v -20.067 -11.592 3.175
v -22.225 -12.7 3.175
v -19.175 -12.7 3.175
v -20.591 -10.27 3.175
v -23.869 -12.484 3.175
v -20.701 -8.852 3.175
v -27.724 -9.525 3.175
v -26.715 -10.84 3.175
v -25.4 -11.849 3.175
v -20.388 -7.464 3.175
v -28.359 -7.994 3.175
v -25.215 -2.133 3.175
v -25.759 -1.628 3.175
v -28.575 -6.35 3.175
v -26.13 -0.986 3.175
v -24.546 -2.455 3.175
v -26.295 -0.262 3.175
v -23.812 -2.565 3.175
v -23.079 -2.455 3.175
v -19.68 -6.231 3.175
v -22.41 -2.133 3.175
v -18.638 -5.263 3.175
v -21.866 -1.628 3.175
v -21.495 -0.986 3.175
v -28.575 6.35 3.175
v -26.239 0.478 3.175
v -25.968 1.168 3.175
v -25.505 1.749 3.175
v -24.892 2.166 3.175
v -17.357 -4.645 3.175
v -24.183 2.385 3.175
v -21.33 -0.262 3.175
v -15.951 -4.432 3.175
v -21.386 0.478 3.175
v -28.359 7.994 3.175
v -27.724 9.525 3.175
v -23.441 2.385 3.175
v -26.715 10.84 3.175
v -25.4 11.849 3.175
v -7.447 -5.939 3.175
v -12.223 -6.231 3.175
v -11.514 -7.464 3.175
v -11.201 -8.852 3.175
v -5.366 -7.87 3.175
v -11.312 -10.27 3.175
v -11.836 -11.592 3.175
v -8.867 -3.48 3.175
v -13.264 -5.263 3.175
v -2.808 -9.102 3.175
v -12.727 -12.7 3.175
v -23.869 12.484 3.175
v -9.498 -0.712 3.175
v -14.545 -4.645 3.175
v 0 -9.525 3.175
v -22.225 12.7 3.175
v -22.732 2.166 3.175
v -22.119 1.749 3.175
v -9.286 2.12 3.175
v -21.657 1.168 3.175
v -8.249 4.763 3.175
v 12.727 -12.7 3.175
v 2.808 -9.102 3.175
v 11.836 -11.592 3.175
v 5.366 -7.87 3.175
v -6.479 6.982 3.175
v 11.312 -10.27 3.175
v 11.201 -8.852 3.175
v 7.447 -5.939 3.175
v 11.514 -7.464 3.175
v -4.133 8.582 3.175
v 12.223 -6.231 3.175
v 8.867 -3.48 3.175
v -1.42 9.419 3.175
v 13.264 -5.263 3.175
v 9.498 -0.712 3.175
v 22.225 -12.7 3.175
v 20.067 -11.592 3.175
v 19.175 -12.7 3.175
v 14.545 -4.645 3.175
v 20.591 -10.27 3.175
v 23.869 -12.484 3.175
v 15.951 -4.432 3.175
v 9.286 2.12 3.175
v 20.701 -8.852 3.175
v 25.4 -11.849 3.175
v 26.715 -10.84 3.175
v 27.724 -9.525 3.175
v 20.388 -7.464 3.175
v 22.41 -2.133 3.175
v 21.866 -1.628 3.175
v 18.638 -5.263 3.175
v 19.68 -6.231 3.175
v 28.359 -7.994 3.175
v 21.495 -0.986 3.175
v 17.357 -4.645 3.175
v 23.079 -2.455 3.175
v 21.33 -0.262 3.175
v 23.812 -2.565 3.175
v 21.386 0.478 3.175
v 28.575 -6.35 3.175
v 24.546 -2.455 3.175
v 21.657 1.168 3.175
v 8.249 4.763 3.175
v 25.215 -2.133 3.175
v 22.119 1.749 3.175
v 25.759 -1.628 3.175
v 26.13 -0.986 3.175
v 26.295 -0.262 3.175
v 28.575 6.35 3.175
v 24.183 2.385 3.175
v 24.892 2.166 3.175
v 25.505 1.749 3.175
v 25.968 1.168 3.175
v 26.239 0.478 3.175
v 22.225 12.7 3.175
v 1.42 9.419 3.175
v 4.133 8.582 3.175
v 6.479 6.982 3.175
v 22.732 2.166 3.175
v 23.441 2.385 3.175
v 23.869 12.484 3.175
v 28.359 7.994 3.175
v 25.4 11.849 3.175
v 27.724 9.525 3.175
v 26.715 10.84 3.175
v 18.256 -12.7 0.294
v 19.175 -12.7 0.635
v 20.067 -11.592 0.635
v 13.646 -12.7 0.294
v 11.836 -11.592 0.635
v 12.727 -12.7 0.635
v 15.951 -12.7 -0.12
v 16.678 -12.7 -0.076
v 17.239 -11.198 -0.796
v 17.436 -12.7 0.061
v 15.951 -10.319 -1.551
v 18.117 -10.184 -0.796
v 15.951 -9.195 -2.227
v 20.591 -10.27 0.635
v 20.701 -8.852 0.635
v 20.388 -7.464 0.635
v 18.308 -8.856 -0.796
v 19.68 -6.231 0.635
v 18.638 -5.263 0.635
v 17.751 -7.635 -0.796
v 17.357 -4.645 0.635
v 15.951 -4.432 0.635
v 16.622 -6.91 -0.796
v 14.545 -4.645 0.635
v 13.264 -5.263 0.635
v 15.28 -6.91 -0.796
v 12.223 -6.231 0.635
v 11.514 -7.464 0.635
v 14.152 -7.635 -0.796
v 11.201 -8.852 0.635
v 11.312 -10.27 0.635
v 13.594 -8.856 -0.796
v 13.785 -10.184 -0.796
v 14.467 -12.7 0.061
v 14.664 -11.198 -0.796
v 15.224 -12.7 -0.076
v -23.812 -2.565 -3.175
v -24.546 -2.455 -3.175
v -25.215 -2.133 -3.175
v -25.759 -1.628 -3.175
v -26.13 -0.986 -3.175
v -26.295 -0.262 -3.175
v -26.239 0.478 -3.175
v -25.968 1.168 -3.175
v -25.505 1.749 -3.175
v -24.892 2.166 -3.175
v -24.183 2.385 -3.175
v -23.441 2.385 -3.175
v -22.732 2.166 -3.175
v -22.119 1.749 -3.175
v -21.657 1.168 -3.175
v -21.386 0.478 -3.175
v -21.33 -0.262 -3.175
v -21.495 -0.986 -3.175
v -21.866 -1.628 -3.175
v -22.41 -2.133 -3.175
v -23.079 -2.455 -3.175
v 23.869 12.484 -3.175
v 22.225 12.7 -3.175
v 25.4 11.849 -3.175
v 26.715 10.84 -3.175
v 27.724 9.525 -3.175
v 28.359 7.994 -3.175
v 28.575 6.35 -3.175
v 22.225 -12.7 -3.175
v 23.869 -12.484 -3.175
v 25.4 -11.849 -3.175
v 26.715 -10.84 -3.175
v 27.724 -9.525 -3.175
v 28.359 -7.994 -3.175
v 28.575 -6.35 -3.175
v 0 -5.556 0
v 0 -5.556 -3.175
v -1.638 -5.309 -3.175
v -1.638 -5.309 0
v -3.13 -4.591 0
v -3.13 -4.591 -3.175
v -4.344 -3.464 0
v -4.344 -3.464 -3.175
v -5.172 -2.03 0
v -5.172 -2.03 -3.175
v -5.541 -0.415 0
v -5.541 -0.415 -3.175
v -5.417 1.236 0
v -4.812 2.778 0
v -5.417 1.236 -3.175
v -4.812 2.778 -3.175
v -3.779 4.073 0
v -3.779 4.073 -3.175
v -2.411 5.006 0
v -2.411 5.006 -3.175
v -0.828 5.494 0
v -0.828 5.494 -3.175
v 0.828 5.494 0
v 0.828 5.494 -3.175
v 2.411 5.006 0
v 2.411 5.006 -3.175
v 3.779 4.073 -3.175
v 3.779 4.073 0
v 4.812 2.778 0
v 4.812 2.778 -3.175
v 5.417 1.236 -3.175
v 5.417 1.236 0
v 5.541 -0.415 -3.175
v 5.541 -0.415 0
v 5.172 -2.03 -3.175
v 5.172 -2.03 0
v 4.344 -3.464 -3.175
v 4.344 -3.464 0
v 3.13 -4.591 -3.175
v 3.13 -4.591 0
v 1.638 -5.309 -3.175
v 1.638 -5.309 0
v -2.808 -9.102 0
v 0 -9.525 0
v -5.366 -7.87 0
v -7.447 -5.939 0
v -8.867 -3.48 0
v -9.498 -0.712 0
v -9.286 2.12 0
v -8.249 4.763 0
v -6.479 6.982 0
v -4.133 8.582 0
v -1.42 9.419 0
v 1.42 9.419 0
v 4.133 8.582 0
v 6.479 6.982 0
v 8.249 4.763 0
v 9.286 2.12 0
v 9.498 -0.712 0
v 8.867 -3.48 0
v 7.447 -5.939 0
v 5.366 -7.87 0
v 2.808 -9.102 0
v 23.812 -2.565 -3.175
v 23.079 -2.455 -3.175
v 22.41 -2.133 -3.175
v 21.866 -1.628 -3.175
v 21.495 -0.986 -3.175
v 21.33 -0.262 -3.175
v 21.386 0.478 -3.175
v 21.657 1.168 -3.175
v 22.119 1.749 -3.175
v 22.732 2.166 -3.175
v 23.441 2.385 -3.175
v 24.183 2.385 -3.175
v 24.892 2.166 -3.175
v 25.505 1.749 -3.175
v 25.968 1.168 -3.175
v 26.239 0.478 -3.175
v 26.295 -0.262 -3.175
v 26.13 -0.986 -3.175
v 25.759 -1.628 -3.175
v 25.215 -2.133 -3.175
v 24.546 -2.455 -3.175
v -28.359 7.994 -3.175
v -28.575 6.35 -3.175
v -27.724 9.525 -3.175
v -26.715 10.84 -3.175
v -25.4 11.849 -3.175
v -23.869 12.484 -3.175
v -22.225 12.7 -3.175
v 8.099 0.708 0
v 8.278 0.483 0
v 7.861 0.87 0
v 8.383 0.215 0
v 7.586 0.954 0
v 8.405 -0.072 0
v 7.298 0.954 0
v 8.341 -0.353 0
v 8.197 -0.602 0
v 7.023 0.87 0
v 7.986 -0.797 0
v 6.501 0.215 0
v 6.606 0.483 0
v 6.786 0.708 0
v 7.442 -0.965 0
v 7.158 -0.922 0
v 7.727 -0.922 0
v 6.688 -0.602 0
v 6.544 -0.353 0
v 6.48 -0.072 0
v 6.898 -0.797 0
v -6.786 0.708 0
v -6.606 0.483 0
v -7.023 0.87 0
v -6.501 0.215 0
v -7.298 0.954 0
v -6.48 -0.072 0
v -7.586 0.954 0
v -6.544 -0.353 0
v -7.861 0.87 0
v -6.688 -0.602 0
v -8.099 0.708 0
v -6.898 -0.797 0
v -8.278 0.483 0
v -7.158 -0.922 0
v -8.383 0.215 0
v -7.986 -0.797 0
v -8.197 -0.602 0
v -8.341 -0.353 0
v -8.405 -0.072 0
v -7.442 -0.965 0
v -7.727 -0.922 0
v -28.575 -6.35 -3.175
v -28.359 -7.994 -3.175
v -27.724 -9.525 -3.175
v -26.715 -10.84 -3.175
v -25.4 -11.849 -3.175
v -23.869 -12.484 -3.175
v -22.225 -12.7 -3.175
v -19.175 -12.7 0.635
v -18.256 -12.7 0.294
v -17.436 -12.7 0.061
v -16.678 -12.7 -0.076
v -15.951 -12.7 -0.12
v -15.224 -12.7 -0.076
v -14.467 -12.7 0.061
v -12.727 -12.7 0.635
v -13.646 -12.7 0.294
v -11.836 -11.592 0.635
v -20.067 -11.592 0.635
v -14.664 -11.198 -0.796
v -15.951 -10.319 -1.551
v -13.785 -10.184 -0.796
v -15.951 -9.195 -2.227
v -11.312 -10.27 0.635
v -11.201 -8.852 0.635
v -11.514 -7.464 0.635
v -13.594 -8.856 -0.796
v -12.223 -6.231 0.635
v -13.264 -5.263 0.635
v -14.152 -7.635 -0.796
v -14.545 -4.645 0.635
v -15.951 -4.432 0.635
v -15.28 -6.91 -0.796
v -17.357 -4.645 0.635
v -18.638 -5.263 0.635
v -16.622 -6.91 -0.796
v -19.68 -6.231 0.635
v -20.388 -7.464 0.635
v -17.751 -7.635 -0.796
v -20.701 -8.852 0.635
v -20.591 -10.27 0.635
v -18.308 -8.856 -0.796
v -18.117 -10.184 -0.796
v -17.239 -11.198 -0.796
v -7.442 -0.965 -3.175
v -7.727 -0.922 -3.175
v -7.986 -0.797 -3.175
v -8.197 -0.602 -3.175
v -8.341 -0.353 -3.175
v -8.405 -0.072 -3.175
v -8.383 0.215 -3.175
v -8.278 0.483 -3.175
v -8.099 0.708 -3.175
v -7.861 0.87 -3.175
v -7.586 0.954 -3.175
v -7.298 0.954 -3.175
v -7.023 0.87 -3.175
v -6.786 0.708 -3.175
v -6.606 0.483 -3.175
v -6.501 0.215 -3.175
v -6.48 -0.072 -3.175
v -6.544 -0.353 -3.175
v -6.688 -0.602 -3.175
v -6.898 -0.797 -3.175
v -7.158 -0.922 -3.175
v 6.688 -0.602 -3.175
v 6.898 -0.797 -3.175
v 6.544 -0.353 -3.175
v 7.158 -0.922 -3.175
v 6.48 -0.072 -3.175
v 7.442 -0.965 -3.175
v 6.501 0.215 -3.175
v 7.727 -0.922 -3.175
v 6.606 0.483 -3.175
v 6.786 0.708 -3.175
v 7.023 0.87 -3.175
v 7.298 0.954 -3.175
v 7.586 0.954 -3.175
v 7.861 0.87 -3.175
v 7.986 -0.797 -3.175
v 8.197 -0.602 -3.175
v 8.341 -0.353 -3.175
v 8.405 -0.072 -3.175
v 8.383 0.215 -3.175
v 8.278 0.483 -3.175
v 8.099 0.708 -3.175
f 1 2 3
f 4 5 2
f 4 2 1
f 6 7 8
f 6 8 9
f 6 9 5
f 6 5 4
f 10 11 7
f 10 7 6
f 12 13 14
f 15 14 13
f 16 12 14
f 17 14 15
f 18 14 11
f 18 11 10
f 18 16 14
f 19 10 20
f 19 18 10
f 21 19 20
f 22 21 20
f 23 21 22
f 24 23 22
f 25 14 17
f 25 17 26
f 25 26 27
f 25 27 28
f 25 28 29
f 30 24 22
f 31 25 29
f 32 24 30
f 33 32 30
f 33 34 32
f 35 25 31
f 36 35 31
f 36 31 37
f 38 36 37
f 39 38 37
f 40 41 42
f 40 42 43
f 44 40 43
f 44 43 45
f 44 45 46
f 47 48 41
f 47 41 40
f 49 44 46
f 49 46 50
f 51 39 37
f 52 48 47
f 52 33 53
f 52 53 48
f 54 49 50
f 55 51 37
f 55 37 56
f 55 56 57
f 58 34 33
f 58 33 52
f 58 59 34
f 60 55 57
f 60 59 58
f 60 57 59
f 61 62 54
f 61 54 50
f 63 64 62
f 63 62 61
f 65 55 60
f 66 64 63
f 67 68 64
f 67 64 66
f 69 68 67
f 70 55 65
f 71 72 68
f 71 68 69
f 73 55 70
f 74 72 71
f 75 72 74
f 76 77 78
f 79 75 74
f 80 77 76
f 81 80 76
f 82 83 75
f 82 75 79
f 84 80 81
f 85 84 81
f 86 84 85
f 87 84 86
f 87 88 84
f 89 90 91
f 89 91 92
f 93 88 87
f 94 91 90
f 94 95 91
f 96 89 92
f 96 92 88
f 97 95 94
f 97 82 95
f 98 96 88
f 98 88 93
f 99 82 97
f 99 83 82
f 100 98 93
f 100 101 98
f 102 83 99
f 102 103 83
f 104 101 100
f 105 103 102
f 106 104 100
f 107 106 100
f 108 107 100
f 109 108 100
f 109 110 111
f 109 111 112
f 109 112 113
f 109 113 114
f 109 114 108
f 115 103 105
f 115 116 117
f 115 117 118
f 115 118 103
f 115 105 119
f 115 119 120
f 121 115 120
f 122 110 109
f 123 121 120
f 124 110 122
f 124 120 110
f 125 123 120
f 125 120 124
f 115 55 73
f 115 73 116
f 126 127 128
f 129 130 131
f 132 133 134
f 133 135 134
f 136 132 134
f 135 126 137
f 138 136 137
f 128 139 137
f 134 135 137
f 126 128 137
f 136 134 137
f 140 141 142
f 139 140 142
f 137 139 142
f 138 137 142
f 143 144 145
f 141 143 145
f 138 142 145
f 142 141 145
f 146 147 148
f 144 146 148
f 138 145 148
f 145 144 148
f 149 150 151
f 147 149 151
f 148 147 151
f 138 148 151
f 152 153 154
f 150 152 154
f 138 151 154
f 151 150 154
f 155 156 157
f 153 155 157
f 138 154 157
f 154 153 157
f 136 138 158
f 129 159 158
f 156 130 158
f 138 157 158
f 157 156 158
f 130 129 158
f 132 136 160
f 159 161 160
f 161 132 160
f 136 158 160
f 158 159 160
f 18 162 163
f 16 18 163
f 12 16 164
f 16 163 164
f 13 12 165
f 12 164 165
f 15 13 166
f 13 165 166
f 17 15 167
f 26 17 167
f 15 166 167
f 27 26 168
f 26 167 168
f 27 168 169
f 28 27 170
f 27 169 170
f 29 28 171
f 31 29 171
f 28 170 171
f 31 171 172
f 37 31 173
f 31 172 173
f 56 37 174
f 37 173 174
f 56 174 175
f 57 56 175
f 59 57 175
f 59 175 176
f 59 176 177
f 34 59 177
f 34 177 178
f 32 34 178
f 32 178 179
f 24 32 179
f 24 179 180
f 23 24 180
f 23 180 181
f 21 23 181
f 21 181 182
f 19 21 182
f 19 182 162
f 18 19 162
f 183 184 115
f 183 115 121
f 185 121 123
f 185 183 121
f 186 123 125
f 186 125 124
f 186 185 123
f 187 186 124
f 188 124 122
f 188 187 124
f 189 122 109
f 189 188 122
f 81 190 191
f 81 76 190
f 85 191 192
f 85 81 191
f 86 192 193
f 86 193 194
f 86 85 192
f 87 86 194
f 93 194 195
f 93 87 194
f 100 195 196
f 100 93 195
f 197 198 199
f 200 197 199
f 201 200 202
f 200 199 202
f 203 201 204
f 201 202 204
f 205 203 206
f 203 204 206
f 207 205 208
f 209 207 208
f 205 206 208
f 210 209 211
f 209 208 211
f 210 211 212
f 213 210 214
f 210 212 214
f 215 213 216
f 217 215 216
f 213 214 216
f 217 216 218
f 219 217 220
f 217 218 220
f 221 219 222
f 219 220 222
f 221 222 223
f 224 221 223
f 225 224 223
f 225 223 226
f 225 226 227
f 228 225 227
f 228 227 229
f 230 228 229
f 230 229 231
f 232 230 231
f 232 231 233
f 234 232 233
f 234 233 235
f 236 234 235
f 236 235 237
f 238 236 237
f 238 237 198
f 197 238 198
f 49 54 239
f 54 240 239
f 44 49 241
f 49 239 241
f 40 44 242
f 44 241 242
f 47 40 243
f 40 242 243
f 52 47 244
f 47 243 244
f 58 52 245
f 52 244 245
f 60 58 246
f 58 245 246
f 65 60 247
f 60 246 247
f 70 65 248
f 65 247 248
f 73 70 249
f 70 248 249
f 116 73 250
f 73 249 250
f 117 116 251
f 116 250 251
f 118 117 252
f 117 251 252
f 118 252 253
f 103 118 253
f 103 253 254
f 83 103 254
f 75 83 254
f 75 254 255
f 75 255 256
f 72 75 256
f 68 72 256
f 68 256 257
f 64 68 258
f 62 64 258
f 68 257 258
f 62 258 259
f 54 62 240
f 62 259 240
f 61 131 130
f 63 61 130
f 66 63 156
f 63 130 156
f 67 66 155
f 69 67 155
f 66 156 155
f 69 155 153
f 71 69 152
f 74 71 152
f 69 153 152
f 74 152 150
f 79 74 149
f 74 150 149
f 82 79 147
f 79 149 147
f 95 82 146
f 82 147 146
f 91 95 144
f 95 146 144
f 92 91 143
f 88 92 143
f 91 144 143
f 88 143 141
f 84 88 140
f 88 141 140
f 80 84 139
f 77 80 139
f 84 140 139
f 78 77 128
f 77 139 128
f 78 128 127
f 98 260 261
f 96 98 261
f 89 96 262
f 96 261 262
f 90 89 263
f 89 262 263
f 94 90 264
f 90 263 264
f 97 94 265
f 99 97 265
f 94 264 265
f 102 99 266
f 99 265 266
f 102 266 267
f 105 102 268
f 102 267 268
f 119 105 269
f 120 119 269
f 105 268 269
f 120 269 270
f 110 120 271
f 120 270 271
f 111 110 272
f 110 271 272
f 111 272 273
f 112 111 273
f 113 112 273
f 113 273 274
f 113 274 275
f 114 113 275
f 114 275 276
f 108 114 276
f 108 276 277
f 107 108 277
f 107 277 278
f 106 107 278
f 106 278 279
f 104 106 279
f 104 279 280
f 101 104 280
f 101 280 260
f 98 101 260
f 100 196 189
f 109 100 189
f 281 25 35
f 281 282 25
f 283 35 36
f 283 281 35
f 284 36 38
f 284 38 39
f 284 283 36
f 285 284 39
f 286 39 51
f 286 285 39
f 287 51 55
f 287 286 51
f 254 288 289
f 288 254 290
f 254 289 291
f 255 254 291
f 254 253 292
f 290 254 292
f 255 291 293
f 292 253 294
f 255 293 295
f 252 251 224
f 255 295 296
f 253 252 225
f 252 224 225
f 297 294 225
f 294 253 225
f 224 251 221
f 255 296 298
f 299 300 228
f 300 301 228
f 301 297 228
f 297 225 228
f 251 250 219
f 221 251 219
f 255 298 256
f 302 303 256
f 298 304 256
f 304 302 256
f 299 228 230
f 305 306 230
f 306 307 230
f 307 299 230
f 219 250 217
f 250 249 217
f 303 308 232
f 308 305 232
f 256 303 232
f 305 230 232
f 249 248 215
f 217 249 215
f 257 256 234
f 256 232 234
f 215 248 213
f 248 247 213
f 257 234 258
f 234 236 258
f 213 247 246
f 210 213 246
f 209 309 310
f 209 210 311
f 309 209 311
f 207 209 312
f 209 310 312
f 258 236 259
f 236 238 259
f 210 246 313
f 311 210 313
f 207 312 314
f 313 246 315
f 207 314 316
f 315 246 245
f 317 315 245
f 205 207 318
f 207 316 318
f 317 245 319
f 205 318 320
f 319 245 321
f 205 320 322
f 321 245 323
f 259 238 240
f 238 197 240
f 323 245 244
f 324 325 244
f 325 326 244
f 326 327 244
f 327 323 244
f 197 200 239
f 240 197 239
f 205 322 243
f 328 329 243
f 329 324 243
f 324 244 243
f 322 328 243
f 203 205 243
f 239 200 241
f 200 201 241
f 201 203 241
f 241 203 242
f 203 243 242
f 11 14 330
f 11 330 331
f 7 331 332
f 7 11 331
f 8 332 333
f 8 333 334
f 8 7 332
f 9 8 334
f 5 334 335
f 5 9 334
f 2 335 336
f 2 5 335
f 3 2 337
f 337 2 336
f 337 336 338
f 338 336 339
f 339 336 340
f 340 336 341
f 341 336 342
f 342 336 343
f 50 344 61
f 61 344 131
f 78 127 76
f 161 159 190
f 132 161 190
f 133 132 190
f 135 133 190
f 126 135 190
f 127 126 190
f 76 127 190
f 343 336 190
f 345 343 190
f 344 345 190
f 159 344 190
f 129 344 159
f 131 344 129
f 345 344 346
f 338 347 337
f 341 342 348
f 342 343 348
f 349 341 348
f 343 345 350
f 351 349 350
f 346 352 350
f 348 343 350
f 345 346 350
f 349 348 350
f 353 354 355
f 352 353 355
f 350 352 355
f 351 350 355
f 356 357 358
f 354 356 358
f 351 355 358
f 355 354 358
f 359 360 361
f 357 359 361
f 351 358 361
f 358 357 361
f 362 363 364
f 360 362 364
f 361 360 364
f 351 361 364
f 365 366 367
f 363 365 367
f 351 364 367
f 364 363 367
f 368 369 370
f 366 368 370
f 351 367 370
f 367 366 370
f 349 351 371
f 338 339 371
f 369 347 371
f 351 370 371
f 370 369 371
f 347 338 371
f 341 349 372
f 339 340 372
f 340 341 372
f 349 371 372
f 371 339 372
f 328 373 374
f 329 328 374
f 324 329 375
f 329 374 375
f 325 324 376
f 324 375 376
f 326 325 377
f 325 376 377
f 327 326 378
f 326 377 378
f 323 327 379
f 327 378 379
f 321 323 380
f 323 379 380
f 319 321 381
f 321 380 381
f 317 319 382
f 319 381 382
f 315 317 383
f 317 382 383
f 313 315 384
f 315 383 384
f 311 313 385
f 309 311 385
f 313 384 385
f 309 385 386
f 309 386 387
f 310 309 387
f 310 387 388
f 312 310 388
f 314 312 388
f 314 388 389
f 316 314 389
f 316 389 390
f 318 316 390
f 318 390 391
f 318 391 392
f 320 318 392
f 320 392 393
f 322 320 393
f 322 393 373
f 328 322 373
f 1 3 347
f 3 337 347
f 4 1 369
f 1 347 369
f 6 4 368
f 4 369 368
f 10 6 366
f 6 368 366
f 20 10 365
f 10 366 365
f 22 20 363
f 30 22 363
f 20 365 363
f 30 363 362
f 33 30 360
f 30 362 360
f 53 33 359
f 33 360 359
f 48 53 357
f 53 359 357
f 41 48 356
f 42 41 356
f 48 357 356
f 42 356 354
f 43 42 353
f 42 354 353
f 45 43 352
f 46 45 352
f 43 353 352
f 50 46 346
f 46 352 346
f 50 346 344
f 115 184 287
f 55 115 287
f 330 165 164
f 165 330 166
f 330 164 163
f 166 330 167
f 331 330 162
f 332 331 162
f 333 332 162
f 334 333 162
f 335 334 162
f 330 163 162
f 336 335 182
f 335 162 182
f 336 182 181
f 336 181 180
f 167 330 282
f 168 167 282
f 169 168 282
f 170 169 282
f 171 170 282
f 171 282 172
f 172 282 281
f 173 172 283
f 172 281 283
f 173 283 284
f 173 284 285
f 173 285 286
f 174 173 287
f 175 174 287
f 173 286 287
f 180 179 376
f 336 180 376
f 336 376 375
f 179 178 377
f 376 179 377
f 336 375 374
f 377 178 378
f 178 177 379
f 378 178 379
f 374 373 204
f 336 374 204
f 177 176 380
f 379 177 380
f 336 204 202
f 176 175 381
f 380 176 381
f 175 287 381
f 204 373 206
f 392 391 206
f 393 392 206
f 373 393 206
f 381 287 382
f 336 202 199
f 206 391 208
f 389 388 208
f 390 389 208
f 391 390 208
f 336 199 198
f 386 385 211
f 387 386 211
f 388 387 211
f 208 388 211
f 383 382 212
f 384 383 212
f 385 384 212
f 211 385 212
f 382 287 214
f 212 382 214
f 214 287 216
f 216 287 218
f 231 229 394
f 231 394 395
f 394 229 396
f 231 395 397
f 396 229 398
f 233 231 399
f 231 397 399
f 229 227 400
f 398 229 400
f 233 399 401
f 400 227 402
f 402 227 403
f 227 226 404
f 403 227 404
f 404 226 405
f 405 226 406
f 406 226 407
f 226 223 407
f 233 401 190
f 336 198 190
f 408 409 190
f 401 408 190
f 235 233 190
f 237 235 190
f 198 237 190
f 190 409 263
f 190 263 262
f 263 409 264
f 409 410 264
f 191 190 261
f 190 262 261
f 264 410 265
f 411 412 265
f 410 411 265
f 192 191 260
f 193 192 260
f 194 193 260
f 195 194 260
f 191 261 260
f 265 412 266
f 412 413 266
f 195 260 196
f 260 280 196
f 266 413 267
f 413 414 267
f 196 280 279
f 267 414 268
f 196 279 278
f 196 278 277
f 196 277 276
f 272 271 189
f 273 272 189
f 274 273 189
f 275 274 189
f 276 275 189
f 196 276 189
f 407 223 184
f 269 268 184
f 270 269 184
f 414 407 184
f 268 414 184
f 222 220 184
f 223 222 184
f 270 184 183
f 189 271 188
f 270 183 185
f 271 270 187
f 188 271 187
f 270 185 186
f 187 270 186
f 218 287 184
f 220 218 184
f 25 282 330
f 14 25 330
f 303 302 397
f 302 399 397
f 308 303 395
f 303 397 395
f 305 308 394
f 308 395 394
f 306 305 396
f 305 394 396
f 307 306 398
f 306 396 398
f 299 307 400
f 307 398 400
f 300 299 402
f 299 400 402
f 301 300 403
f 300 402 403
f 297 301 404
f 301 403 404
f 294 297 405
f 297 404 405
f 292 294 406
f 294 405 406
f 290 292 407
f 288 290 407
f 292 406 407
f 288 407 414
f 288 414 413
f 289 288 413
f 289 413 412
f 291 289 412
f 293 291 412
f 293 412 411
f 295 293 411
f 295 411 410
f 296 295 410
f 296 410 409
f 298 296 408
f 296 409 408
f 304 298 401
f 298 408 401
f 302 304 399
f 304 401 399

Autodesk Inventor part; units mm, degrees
ref_plane "YZ Plane" through (0, 0, 0) normal (1, 0, 0) x (0, 1, 0)
ref_plane "XZ Plane" through (0, 0, 0) normal (0, 1, 0) x (-1, 0, 0)
ref_plane "XY Plane" through (0, 0, 0) normal (0, 0, 1) x (1, 0, 0)
sketch "Sketch1" plane through (0, 0, 0) normal (0, 0, 1) x (1, 0, 0)
  line L0 (-28.575, -12.7) -> (28.575, -12.7)
  line L1 (28.575, -12.7) -> (28.575, 12.7)
  line L2 (28.575, 12.7) -> (-28.575, 12.7)
  line L3 (-28.575, 12.7) -> (-28.575, -12.7)
  point P0 (0, 0)
  dimension "d0" = 57.15
  dimension "d1" = 25.4
  dimension "d33" = 28.575
  dimension "d34" = 12.7
extrude "Extrusion1" add sketch "Sketch1" along normal blind 3.175 and the other way blind 3.175
sketch "Sketch2" plane through (0, 0, 3.175) normal (0, 0, 1) x (1, 0, 0)
  line L0 (-28.575, -12.7) -> (28.575, -12.7) projected
  line L1 (28.575, -12.7) -> (28.575, 12.7) projected
  line L2 (28.575, 12.7) -> (-28.575, 12.7) projected
  line L3 (-28.575, 12.7) -> (-28.575, -12.7) projected
  point P0 (0, 0)
  point P1 (0, 0)
  dimension "d4" = 28.575
  dimension "d5" = 12.7
  dimension "d6" = 57.15
hole "Hole1" at (0, 0, 3.175) direction (0, 0, -1) diameter 11.1125 end through all counterbore diameter 19.05 counterbore depth 3.175
sketch "Sketch3" plane through (0, 0, 3.175) normal (0, 0, 1) x (1, 0, 0)
  circle A0 centre (0, 0) radius 9.525 projected
  line L0 (-28.575, -12.7) -> (28.575, -12.7) projected
  line L1 (28.575, -12.7) -> (28.575, 12.7) projected
  line L2 (28.575, 12.7) -> (-28.575, 12.7) projected
  line L3 (-28.575, 12.7) -> (-28.575, -12.7) projected
  point P0 (0, 0)
  point P1 (-23.8124, -0.0762)
  point P2 (23.8124, -0.0762)
  dimension "d14" = 23.8125
  dimension "d15" = 23.8125
  dimension "d59" = 0.0762
hole "Hole2" at (-23.8124, -0.0762, 3.175) at (23.8124, -0.0762, 3.175) direction (0, 0, -1) diameter 4.9784 end through all clearance for "Flat Head Machine Screw (82)" size "#10" standard "Ansi Unified Screw Threads"
sketch "Sketch4" plane through (0, 0, 3.175) normal (0, 0, 1) x (1, 0, 0)
  circle A0 centre (-23.8124, -0.0762) radius 2.4892 projected
  circle A1 centre (23.8124, -0.0762) radius 2.4892 projected
  circle A2 centre (0, 0) radius 9.525 projected
  line L0 (-28.575, -12.7) -> (28.575, -12.7) projected
  line L1 (28.575, -12.7) -> (28.575, 12.7) projected
  line L2 (28.575, 12.7) -> (-28.575, 12.7) projected
  line L3 (-28.575, 12.7) -> (-28.575, -12.7) projected
  point P0 (0, 0)
  point P1 (-7.4422, 0)
  point P2 (7.4422, 0)
  dimension "d23" = 7.4422
  dimension "d24" = 7.4422
hole "Hole3" at (-7.4422, 0, 3.175) at (7.4422, 0, 3.175) direction (0, 0, -1) diameter 1.9304 end through all
fillet "Fillet1" radius 6.35 4 edges at (28.575, 12.7, 0) (-28.575, 12.7, 0) (-28.575, -12.7, 0) (28.575, -12.7, 0)
sketch "Sketch5" plane through (0, 0, 3.175) normal (0, 0, 1) x (1, 0, 0)
  line L0 (28.575, -6.35) -> (28.575, 6.35) projected
  line L1 (-28.575, 6.35) -> (-28.575, -6.35) projected
  line L2 (-22.225, -12.7) -> (22.225, -12.7) projected
  line L3 (22.225, 12.7) -> (-22.225, 12.7) projected
  point P0 (0, 0)
  point P1 (15.9512, -9.1948)
  point P2 (-15.9512, -9.1948)
  dimension "d41" = 12.6238
  dimension "d42" = 12.6238
  dimension "d43" = 3.5052
hole "Hole5" at (15.9512, -9.1948, 3.175) at (-15.9512, -9.1948, 3.175) direction (0, 0, -1) diameter 9.525 depth 2.54 tip angle 118
equation "\"d33\" = 0.5 * d0"
equation "\"d34\" = 0.5 * d1"
equation "\"d4\" = 0.5 * d6"
equation "\"d15\" = d14"
equation "\"d24\" = d23"
properties part number "CHA_010_EncoderMountRev0" material "ABS Plastic"
